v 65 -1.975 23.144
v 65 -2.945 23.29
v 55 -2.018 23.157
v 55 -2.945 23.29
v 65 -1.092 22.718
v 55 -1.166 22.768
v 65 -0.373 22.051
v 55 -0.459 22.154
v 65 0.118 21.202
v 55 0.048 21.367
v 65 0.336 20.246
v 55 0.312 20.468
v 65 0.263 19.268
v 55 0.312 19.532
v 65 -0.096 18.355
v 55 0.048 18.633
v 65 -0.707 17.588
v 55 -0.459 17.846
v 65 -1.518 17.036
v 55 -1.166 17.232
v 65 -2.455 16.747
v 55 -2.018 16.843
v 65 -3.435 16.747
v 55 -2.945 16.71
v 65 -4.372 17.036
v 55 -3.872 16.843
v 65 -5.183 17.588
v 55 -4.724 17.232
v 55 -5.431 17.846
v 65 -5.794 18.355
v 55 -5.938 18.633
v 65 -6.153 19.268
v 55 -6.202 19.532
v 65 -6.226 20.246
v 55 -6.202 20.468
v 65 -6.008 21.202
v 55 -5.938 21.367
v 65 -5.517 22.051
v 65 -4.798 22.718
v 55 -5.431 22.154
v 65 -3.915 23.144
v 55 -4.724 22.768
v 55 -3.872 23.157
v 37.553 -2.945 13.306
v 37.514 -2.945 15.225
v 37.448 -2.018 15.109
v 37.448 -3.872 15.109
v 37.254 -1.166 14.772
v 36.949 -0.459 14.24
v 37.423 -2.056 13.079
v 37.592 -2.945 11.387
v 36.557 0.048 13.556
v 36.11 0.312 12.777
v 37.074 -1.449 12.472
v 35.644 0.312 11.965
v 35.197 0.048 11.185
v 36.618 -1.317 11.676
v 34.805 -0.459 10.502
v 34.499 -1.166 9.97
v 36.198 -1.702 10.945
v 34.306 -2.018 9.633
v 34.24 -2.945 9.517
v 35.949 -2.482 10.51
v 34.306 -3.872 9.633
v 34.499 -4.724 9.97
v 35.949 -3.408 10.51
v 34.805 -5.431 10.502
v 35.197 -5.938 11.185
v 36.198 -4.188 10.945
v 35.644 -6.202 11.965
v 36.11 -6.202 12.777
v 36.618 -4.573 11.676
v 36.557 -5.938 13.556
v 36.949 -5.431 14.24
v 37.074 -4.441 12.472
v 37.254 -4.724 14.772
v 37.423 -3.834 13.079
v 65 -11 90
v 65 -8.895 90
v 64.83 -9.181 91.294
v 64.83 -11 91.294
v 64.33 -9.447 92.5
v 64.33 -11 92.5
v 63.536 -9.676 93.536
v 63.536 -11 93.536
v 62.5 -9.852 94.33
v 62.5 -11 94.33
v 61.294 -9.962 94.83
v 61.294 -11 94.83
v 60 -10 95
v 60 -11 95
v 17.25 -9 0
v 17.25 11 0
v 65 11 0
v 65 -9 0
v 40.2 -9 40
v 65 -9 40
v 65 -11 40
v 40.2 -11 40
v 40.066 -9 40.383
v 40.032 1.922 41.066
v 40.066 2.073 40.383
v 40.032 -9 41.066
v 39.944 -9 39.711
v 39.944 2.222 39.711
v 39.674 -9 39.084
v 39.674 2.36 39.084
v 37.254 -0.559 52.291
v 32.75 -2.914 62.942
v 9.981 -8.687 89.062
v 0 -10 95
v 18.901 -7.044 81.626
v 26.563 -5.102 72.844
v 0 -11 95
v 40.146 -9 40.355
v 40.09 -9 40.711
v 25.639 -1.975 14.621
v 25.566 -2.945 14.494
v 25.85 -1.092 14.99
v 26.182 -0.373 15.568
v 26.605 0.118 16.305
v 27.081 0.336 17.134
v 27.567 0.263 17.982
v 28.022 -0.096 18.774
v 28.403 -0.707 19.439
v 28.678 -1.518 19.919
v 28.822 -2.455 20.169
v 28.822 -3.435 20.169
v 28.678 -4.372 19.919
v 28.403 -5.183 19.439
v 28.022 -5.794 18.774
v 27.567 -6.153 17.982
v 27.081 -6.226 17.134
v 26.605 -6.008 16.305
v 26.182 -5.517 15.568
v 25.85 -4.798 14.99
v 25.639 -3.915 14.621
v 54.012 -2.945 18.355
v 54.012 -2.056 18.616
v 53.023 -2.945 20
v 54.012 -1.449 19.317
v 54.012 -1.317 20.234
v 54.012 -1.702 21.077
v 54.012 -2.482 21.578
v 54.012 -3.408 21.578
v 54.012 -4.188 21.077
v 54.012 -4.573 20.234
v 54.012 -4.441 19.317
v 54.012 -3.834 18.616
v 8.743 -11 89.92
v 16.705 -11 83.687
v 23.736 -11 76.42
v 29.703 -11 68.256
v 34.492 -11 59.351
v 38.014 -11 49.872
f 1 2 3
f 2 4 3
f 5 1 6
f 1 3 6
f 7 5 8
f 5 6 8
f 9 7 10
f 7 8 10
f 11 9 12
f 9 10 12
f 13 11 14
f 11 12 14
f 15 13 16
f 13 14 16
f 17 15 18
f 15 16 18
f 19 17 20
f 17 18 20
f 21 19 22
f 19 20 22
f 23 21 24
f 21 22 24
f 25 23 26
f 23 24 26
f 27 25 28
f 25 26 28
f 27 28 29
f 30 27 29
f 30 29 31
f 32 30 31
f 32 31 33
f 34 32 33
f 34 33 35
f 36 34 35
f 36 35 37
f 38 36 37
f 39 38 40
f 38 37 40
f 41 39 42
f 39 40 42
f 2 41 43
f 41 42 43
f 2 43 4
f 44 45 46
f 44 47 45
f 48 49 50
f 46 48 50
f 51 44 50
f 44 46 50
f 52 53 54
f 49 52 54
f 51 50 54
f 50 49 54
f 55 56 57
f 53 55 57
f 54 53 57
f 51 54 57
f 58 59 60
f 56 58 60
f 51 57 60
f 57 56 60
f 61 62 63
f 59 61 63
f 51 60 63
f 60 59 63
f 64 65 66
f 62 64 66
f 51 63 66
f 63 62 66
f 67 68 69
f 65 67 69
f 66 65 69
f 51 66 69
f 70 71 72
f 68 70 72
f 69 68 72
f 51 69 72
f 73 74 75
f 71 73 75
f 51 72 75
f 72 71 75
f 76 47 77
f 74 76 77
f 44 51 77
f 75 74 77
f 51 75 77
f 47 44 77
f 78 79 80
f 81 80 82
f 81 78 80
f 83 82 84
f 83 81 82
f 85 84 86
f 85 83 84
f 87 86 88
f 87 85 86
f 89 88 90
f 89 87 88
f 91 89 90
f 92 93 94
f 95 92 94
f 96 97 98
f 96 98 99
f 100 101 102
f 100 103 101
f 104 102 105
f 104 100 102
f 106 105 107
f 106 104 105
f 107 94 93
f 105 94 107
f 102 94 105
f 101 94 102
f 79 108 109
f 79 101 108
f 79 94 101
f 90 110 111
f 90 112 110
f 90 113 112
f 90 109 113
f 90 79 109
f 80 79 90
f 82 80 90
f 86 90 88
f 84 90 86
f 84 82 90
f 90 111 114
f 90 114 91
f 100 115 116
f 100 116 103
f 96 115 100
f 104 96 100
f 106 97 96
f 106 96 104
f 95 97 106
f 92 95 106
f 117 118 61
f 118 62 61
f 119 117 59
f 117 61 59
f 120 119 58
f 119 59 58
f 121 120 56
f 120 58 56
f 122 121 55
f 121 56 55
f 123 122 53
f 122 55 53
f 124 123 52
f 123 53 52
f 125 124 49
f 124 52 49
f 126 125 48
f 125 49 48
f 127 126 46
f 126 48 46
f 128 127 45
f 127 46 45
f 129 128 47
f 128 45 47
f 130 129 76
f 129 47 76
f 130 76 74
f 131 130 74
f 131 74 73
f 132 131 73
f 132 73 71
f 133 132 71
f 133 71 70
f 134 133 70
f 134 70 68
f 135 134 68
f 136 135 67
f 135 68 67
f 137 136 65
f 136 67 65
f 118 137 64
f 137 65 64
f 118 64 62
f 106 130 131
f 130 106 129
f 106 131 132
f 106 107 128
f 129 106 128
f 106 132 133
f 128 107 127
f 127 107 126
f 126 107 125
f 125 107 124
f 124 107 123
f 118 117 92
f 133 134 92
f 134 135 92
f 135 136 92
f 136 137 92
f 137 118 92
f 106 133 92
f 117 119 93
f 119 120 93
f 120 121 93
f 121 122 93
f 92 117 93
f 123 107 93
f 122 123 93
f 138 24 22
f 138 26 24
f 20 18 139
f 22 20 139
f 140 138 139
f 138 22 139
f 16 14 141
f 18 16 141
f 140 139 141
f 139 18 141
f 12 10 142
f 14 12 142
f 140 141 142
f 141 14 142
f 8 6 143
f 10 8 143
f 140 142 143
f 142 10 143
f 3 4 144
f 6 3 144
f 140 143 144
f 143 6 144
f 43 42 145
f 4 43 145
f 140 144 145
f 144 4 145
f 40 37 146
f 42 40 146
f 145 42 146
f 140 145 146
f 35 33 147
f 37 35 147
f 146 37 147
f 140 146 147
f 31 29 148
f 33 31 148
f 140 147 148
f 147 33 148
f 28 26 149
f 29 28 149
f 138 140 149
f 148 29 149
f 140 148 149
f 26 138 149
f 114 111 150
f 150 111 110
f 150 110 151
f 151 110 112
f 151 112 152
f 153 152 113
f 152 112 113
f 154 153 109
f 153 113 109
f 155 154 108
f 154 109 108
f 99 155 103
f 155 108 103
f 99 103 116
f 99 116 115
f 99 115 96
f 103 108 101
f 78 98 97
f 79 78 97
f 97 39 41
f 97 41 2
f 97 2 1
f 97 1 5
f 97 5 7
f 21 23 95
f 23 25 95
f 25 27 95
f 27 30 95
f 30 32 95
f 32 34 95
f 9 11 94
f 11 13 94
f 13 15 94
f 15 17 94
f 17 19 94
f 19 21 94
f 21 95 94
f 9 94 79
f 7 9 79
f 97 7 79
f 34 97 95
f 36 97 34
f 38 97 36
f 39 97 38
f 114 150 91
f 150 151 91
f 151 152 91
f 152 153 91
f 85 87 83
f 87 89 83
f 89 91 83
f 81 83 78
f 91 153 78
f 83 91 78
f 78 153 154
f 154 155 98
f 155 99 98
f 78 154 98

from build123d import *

# Parameters (mm, degrees)
ESBO_O1_W                                      = 130
ESBO_O1_H                                      = 22
RESSALTO_EXTRUS_O1_DEPTH                       = 95
CORTE_EXTRUS_O2_REACH                          = 24
CORTE_EXTRUS_O3_DEPTH                          = 1
CORTE_EXTRUS_O3_DEPTH_BACK                     = 66
BROCA_DE_ROSQUEAR_DE_CANO_PARA_TARRAXA_D_D     = 6.579997
BROCA_DE_ROSQUEAR_DE_CANO_PARA_TARRAXA_D_DEPTH = 10
BROCA_DE_ROSQUEAR_DE_CANO_PARA_TARRAXA_D_TIP   = 1.976830535
BROCA_DE_ROSQUEAR_DE_CANO_PARA_TARRA_2_D       = 6.579997
BROCA_DE_ROSQUEAR_DE_CANO_PARA_TARRA_2_DEPTH   = 10
BROCA_DE_ROSQUEAR_DE_CANO_PARA_TARRA_2_TIP     = 1.976830535
FILETE2_R                                      = 5
ESBO_O16_W                                     = 47.75
ESBO_O16_H                                     = 2
CORTE_EXTRUS_O6_DEPTH                          = 40
FILETE3_R                                      = 3


with BuildPart() as part:
    # Esboço1 → Ressalto-extrusão1 (new body)
    with BuildSketch(Plane.XY):
        Rectangle(ESBO_O1_W, ESBO_O1_H)
    extrude(amount=RESSALTO_EXTRUS_O1_DEPTH)

    # Esboço2 → Corte-extrusão2 (cut, up to next)
    with BuildSketch(Plane(origin=(0, 11, 0), x_dir=(1, 0, 0), z_dir=(0, 1, 0)), mode=Mode.PRIVATE) as corte_extrus_o2_sk1:
        with BuildLine():
            Line((17.25, 0), (-65, 0))
            Line((-65, 0), (-65, -95))
            Line((-65, -95), (0, -95))
            ThreePointArc((0, -95), (26.860074256, -72.440999729), (40.2, -40))
            Line((40.2, -40), (17.25, 0))
        make_face()
    corte_extrus_o2_tool1 = extrude(corte_extrus_o2_sk1.sketch, amount=-CORTE_EXTRUS_O2_REACH, mode=Mode.PRIVATE) & part.part
    add(corte_extrus_o2_tool1.solids().sort_by_distance((-18.119573, 11, 46.581056))[0], mode=Mode.SUBTRACT)

    # Esboço3 → Corte-extrusão3 (cut, two sides)
    with BuildSketch(Plane(origin=(65, 0, 0), x_dir=(0, 0, -1), z_dir=(1, 0, 0))) as corte_extrus_o3_sk:
        Polygon((200.195338438, 55.253706392), (0, 11), (-95, -10), (-295.195338438, -54.253706392), (-383.702751221, 346.136970485), (111.687925655, 455.644383268), align=None)
    extrude(amount=CORTE_EXTRUS_O3_DEPTH, mode=Mode.SUBTRACT)
    extrude(corte_extrus_o3_sk.sketch, amount=-CORTE_EXTRUS_O3_DEPTH_BACK, mode=Mode.SUBTRACT)

    # Broca de rosquear de cano para tarraxa d
    with Locations(Plane(origin=(65, 0, 0), x_dir=(0, 0, -1), z_dir=(1, 0, 0))):
        with Locations((-20, -2.945)):
            Hole(BROCA_DE_ROSQUEAR_DE_CANO_PARA_TARRAXA_D_D / 2, depth=BROCA_DE_ROSQUEAR_DE_CANO_PARA_TARRAXA_D_DEPTH)
            with Locations((0, 0, -(BROCA_DE_ROSQUEAR_DE_CANO_PARA_TARRAXA_D_DEPTH + BROCA_DE_ROSQUEAR_DE_CANO_PARA_TARRAXA_D_TIP / 2))):  # 118° drill point
                Cone(0, BROCA_DE_ROSQUEAR_DE_CANO_PARA_TARRAXA_D_D / 2, BROCA_DE_ROSQUEAR_DE_CANO_PARA_TARRAXA_D_TIP, mode=Mode.SUBTRACT)

    # Broca de rosquear de cano para tarra 2
    with Locations(Plane(origin=(12.977837756, 0, -7.446034412), x_dir=(0.497656085, 0, 0.867374441), z_dir=(-0.867374441, 0, 0.497656085))):
        with Locations((28.584567474, -2.945)):
            Hole(BROCA_DE_ROSQUEAR_DE_CANO_PARA_TARRA_2_D / 2, depth=BROCA_DE_ROSQUEAR_DE_CANO_PARA_TARRA_2_DEPTH)
            with Locations((0, 0, -(BROCA_DE_ROSQUEAR_DE_CANO_PARA_TARRA_2_DEPTH + BROCA_DE_ROSQUEAR_DE_CANO_PARA_TARRA_2_TIP / 2))):  # 118° drill point
                Cone(0, BROCA_DE_ROSQUEAR_DE_CANO_PARA_TARRA_2_D / 2, BROCA_DE_ROSQUEAR_DE_CANO_PARA_TARRA_2_TIP, mode=Mode.SUBTRACT)

    # Filete2
    filete2_edges = [part.edges().sort_by_distance(p)[0] for p in [
        (65, -10.5, 95),
    ]]
    fillet(filete2_edges, radius=FILETE2_R)

    # Esboço16 → Corte-extrusão6 (cut)
    with BuildSketch(Plane(origin=(0, 0, 0), x_dir=(-1, 0, 0), z_dir=(0, 0, -1))):
        with Locations((-41.125, -10)):
            Rectangle(ESBO_O16_W, ESBO_O16_H)
    extrude(amount=-CORTE_EXTRUS_O6_DEPTH, mode=Mode.SUBTRACT)

    # Filete3
    filete3_edges = [part.edges().sort_by_distance(p)[0] for p in [
        (40.2, -3.421052632, 40),
    ]]
    fillet(filete3_edges, radius=FILETE3_R)


solid = part.part
